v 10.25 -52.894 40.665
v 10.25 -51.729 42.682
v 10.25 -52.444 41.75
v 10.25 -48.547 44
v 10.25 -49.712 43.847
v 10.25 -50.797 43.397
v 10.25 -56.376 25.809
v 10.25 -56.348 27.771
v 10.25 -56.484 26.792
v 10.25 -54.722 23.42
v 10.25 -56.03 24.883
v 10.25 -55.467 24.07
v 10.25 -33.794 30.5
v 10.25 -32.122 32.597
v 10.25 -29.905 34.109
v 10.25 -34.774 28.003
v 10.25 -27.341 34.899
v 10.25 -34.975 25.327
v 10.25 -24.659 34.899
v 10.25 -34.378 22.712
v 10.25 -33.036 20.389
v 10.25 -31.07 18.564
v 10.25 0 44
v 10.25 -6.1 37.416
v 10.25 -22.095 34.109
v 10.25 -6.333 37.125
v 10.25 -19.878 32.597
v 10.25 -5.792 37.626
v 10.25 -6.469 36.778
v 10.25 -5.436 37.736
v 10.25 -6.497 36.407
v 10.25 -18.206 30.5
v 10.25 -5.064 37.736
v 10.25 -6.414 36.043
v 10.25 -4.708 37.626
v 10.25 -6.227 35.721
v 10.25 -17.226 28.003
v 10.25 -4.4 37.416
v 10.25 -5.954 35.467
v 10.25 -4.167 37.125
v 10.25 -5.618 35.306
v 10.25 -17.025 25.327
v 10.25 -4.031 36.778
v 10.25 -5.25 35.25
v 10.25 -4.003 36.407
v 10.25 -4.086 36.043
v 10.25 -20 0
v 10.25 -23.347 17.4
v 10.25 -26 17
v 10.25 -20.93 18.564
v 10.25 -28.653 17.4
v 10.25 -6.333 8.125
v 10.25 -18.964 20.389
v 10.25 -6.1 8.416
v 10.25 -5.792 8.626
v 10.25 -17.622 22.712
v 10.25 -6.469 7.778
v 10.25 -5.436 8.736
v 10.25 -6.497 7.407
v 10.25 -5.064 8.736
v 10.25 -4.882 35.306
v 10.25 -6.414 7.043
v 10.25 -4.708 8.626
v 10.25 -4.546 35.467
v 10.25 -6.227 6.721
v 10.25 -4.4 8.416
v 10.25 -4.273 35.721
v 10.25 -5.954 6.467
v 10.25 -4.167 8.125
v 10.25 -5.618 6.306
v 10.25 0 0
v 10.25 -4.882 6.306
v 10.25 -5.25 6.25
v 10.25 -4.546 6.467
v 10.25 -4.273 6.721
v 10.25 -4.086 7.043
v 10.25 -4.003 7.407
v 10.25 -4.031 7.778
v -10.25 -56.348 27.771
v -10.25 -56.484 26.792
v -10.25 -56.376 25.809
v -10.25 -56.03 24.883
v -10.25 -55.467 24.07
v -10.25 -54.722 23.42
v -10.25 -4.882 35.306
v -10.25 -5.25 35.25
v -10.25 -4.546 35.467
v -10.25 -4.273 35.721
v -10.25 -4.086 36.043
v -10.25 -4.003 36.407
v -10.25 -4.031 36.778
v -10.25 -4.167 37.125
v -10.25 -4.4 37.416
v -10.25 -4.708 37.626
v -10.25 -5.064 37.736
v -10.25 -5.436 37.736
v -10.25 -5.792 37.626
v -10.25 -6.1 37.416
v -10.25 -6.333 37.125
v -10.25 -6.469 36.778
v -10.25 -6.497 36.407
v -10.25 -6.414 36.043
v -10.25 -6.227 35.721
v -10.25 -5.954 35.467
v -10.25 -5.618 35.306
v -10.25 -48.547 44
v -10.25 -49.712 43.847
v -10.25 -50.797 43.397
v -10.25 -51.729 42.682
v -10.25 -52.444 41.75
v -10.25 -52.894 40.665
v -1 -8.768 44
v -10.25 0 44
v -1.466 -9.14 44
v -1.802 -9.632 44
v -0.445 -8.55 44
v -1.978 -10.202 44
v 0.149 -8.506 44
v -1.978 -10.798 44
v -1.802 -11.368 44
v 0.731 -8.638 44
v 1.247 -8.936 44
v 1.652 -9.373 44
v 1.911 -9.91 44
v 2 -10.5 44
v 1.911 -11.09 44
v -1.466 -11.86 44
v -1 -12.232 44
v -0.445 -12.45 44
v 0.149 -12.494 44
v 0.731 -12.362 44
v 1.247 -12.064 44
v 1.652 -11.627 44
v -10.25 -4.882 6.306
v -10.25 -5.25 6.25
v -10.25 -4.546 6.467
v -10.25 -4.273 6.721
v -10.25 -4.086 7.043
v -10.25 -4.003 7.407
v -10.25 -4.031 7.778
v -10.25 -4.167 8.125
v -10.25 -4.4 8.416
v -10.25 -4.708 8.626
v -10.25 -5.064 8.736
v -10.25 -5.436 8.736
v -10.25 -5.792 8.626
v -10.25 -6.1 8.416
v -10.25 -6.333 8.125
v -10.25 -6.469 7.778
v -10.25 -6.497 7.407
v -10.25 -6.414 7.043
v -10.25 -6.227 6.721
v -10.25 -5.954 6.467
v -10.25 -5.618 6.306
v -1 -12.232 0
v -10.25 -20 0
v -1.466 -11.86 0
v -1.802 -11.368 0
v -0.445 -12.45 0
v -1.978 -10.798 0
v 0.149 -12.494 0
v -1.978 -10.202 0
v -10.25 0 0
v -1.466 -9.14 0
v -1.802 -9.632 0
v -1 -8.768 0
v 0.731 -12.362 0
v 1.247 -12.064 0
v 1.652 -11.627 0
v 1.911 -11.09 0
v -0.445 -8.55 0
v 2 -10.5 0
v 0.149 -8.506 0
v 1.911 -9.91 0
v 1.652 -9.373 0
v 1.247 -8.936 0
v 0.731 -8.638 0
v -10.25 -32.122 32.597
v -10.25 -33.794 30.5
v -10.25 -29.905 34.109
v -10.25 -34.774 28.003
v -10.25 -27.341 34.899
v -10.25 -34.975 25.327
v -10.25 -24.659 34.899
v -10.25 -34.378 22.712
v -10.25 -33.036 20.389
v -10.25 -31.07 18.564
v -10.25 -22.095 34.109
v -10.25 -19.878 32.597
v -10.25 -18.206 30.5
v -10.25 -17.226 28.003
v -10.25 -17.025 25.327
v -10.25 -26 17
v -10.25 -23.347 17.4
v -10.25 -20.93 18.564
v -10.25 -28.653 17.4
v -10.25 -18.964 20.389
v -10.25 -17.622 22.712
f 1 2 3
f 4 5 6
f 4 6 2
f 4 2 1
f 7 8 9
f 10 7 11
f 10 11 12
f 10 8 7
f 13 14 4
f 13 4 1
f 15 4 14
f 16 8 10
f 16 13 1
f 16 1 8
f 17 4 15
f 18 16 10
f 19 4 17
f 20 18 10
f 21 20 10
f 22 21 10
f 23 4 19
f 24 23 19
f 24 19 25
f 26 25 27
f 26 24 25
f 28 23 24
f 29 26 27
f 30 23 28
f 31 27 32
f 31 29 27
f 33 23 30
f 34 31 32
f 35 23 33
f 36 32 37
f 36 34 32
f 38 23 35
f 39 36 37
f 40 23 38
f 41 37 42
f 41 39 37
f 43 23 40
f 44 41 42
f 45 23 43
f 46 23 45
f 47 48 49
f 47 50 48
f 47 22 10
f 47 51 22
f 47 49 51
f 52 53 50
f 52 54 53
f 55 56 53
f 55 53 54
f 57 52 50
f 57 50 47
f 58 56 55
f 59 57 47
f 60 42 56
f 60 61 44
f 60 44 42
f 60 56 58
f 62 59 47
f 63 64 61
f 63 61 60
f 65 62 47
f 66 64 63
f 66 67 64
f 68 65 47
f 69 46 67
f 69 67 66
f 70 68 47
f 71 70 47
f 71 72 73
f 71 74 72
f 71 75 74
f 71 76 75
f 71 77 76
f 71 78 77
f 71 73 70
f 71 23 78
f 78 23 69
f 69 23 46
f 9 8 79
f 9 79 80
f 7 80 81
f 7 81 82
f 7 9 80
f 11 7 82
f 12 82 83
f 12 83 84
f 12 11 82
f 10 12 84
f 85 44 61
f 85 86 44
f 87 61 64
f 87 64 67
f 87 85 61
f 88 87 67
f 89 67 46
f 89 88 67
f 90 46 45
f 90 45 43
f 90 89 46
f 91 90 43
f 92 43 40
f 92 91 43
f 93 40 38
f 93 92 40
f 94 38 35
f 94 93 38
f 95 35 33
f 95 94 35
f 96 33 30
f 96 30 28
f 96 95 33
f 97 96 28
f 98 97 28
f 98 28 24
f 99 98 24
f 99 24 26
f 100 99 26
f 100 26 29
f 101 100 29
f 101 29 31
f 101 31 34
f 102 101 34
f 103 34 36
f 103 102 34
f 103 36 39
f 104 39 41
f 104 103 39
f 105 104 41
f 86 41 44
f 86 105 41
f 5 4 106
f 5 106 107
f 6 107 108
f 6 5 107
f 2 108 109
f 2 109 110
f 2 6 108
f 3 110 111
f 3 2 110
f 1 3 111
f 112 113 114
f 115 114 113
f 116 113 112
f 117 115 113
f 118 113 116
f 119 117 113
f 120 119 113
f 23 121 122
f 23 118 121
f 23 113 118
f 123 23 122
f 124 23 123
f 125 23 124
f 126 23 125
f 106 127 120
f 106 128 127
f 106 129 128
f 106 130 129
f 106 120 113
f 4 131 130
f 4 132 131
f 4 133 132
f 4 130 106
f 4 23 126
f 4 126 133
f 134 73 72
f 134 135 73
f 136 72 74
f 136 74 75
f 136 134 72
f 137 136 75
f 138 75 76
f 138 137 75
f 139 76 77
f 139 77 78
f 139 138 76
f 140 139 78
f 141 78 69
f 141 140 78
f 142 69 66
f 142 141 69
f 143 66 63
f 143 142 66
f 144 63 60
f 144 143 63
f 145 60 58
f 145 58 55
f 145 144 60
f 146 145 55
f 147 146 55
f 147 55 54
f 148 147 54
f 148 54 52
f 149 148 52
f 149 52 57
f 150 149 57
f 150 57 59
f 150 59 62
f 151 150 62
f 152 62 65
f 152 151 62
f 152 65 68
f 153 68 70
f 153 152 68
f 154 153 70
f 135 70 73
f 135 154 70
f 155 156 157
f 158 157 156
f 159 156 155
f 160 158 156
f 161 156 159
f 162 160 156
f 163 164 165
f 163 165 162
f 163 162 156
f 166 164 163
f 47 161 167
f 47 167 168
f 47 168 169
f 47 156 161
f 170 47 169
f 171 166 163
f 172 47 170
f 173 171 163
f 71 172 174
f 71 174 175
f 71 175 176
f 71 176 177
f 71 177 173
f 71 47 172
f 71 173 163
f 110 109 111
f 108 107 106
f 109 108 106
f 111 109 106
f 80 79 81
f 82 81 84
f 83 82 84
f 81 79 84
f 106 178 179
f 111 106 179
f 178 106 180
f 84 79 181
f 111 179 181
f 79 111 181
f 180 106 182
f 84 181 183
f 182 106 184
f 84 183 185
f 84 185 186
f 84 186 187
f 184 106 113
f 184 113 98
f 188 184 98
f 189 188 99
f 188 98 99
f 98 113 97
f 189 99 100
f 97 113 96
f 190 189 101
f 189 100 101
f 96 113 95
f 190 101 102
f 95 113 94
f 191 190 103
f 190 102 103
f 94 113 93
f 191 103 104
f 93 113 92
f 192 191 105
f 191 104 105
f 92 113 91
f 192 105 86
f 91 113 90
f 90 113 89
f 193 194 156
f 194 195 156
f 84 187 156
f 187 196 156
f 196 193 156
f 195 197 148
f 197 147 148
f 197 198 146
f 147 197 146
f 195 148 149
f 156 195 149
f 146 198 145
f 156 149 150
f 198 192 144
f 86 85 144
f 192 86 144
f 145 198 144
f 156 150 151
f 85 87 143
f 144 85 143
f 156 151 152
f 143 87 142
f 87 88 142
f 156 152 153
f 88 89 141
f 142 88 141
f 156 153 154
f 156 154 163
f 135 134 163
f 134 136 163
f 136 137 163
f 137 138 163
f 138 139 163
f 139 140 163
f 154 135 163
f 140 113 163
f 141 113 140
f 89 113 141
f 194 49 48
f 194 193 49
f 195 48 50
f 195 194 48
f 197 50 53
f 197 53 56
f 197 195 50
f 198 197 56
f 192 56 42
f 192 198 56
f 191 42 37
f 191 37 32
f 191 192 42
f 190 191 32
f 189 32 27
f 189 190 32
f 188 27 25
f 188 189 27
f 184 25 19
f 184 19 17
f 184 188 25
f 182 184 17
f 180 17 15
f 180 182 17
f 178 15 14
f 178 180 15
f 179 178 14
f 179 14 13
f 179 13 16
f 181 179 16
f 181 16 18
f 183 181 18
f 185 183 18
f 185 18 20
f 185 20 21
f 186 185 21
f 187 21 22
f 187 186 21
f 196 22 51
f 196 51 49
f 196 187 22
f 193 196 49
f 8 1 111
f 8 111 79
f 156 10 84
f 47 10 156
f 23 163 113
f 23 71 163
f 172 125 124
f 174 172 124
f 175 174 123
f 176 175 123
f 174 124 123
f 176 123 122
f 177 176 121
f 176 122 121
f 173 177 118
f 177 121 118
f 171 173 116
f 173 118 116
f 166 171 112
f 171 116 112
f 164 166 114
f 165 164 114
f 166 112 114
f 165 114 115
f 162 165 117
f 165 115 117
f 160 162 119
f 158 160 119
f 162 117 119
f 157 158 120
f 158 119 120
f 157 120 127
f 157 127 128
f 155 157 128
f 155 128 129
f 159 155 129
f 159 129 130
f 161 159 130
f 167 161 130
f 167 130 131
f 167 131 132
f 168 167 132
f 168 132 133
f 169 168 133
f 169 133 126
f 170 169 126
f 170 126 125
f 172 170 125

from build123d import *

# Parameters (mm, degrees)
SKETCH_1_R          = 9
SKETCH_1_R_2        = 1.25
EXTRUDE_1_DEPTH     = 10.25
SKETCH_2_R          = 2
CUT_EXTRUDE_1_DEPTH = 45


with BuildPart() as part:
    # 草圖1 → 填料-伸長1 (new body, symmetric)
    with BuildSketch(Plane(origin=(0, 0, 0), x_dir=(0, 0, -1), z_dir=(1, 0, 0))):
        with BuildLine():
            Line((-44, 0), (-44, -48.547028554))
            ThreePointArc((-44, -48.547028554), (-43.070090031, -51.286454985), (-40.664685703, -52.893694772))
            Line((-40.664685703, -52.893694772), (-27.771382825, -56.348444866))
            ThreePointArc((-27.771382825, -56.348444866), (-25.335277119, -56.231430318), (-23.419956354, -54.721513175))
            Line((-23.419956354, -54.721513175), (0, -20))
            Line((0, -20), (0, 0))
            Line((0, 0), (-44, 0))
        make_face()
        with Locations((-26, -26)):
            Circle(SKETCH_1_R, mode=Mode.SUBTRACT)
        with Locations((-36.5, -5.25)):
            Circle(SKETCH_1_R_2, mode=Mode.SUBTRACT)
        with Locations((-7.5, -5.25)):
            Circle(SKETCH_1_R_2, mode=Mode.SUBTRACT)
    extrude(amount=EXTRUDE_1_DEPTH, both=True)

    # 草圖2 → 除料-伸長1 (cut, through all)
    with BuildSketch(Plane.XY.offset(44)):
        with Locations((0, -10.5)):
            Circle(SKETCH_2_R)
    extrude(amount=-CUT_EXTRUDE_1_DEPTH, mode=Mode.SUBTRACT)


solid = part.part
